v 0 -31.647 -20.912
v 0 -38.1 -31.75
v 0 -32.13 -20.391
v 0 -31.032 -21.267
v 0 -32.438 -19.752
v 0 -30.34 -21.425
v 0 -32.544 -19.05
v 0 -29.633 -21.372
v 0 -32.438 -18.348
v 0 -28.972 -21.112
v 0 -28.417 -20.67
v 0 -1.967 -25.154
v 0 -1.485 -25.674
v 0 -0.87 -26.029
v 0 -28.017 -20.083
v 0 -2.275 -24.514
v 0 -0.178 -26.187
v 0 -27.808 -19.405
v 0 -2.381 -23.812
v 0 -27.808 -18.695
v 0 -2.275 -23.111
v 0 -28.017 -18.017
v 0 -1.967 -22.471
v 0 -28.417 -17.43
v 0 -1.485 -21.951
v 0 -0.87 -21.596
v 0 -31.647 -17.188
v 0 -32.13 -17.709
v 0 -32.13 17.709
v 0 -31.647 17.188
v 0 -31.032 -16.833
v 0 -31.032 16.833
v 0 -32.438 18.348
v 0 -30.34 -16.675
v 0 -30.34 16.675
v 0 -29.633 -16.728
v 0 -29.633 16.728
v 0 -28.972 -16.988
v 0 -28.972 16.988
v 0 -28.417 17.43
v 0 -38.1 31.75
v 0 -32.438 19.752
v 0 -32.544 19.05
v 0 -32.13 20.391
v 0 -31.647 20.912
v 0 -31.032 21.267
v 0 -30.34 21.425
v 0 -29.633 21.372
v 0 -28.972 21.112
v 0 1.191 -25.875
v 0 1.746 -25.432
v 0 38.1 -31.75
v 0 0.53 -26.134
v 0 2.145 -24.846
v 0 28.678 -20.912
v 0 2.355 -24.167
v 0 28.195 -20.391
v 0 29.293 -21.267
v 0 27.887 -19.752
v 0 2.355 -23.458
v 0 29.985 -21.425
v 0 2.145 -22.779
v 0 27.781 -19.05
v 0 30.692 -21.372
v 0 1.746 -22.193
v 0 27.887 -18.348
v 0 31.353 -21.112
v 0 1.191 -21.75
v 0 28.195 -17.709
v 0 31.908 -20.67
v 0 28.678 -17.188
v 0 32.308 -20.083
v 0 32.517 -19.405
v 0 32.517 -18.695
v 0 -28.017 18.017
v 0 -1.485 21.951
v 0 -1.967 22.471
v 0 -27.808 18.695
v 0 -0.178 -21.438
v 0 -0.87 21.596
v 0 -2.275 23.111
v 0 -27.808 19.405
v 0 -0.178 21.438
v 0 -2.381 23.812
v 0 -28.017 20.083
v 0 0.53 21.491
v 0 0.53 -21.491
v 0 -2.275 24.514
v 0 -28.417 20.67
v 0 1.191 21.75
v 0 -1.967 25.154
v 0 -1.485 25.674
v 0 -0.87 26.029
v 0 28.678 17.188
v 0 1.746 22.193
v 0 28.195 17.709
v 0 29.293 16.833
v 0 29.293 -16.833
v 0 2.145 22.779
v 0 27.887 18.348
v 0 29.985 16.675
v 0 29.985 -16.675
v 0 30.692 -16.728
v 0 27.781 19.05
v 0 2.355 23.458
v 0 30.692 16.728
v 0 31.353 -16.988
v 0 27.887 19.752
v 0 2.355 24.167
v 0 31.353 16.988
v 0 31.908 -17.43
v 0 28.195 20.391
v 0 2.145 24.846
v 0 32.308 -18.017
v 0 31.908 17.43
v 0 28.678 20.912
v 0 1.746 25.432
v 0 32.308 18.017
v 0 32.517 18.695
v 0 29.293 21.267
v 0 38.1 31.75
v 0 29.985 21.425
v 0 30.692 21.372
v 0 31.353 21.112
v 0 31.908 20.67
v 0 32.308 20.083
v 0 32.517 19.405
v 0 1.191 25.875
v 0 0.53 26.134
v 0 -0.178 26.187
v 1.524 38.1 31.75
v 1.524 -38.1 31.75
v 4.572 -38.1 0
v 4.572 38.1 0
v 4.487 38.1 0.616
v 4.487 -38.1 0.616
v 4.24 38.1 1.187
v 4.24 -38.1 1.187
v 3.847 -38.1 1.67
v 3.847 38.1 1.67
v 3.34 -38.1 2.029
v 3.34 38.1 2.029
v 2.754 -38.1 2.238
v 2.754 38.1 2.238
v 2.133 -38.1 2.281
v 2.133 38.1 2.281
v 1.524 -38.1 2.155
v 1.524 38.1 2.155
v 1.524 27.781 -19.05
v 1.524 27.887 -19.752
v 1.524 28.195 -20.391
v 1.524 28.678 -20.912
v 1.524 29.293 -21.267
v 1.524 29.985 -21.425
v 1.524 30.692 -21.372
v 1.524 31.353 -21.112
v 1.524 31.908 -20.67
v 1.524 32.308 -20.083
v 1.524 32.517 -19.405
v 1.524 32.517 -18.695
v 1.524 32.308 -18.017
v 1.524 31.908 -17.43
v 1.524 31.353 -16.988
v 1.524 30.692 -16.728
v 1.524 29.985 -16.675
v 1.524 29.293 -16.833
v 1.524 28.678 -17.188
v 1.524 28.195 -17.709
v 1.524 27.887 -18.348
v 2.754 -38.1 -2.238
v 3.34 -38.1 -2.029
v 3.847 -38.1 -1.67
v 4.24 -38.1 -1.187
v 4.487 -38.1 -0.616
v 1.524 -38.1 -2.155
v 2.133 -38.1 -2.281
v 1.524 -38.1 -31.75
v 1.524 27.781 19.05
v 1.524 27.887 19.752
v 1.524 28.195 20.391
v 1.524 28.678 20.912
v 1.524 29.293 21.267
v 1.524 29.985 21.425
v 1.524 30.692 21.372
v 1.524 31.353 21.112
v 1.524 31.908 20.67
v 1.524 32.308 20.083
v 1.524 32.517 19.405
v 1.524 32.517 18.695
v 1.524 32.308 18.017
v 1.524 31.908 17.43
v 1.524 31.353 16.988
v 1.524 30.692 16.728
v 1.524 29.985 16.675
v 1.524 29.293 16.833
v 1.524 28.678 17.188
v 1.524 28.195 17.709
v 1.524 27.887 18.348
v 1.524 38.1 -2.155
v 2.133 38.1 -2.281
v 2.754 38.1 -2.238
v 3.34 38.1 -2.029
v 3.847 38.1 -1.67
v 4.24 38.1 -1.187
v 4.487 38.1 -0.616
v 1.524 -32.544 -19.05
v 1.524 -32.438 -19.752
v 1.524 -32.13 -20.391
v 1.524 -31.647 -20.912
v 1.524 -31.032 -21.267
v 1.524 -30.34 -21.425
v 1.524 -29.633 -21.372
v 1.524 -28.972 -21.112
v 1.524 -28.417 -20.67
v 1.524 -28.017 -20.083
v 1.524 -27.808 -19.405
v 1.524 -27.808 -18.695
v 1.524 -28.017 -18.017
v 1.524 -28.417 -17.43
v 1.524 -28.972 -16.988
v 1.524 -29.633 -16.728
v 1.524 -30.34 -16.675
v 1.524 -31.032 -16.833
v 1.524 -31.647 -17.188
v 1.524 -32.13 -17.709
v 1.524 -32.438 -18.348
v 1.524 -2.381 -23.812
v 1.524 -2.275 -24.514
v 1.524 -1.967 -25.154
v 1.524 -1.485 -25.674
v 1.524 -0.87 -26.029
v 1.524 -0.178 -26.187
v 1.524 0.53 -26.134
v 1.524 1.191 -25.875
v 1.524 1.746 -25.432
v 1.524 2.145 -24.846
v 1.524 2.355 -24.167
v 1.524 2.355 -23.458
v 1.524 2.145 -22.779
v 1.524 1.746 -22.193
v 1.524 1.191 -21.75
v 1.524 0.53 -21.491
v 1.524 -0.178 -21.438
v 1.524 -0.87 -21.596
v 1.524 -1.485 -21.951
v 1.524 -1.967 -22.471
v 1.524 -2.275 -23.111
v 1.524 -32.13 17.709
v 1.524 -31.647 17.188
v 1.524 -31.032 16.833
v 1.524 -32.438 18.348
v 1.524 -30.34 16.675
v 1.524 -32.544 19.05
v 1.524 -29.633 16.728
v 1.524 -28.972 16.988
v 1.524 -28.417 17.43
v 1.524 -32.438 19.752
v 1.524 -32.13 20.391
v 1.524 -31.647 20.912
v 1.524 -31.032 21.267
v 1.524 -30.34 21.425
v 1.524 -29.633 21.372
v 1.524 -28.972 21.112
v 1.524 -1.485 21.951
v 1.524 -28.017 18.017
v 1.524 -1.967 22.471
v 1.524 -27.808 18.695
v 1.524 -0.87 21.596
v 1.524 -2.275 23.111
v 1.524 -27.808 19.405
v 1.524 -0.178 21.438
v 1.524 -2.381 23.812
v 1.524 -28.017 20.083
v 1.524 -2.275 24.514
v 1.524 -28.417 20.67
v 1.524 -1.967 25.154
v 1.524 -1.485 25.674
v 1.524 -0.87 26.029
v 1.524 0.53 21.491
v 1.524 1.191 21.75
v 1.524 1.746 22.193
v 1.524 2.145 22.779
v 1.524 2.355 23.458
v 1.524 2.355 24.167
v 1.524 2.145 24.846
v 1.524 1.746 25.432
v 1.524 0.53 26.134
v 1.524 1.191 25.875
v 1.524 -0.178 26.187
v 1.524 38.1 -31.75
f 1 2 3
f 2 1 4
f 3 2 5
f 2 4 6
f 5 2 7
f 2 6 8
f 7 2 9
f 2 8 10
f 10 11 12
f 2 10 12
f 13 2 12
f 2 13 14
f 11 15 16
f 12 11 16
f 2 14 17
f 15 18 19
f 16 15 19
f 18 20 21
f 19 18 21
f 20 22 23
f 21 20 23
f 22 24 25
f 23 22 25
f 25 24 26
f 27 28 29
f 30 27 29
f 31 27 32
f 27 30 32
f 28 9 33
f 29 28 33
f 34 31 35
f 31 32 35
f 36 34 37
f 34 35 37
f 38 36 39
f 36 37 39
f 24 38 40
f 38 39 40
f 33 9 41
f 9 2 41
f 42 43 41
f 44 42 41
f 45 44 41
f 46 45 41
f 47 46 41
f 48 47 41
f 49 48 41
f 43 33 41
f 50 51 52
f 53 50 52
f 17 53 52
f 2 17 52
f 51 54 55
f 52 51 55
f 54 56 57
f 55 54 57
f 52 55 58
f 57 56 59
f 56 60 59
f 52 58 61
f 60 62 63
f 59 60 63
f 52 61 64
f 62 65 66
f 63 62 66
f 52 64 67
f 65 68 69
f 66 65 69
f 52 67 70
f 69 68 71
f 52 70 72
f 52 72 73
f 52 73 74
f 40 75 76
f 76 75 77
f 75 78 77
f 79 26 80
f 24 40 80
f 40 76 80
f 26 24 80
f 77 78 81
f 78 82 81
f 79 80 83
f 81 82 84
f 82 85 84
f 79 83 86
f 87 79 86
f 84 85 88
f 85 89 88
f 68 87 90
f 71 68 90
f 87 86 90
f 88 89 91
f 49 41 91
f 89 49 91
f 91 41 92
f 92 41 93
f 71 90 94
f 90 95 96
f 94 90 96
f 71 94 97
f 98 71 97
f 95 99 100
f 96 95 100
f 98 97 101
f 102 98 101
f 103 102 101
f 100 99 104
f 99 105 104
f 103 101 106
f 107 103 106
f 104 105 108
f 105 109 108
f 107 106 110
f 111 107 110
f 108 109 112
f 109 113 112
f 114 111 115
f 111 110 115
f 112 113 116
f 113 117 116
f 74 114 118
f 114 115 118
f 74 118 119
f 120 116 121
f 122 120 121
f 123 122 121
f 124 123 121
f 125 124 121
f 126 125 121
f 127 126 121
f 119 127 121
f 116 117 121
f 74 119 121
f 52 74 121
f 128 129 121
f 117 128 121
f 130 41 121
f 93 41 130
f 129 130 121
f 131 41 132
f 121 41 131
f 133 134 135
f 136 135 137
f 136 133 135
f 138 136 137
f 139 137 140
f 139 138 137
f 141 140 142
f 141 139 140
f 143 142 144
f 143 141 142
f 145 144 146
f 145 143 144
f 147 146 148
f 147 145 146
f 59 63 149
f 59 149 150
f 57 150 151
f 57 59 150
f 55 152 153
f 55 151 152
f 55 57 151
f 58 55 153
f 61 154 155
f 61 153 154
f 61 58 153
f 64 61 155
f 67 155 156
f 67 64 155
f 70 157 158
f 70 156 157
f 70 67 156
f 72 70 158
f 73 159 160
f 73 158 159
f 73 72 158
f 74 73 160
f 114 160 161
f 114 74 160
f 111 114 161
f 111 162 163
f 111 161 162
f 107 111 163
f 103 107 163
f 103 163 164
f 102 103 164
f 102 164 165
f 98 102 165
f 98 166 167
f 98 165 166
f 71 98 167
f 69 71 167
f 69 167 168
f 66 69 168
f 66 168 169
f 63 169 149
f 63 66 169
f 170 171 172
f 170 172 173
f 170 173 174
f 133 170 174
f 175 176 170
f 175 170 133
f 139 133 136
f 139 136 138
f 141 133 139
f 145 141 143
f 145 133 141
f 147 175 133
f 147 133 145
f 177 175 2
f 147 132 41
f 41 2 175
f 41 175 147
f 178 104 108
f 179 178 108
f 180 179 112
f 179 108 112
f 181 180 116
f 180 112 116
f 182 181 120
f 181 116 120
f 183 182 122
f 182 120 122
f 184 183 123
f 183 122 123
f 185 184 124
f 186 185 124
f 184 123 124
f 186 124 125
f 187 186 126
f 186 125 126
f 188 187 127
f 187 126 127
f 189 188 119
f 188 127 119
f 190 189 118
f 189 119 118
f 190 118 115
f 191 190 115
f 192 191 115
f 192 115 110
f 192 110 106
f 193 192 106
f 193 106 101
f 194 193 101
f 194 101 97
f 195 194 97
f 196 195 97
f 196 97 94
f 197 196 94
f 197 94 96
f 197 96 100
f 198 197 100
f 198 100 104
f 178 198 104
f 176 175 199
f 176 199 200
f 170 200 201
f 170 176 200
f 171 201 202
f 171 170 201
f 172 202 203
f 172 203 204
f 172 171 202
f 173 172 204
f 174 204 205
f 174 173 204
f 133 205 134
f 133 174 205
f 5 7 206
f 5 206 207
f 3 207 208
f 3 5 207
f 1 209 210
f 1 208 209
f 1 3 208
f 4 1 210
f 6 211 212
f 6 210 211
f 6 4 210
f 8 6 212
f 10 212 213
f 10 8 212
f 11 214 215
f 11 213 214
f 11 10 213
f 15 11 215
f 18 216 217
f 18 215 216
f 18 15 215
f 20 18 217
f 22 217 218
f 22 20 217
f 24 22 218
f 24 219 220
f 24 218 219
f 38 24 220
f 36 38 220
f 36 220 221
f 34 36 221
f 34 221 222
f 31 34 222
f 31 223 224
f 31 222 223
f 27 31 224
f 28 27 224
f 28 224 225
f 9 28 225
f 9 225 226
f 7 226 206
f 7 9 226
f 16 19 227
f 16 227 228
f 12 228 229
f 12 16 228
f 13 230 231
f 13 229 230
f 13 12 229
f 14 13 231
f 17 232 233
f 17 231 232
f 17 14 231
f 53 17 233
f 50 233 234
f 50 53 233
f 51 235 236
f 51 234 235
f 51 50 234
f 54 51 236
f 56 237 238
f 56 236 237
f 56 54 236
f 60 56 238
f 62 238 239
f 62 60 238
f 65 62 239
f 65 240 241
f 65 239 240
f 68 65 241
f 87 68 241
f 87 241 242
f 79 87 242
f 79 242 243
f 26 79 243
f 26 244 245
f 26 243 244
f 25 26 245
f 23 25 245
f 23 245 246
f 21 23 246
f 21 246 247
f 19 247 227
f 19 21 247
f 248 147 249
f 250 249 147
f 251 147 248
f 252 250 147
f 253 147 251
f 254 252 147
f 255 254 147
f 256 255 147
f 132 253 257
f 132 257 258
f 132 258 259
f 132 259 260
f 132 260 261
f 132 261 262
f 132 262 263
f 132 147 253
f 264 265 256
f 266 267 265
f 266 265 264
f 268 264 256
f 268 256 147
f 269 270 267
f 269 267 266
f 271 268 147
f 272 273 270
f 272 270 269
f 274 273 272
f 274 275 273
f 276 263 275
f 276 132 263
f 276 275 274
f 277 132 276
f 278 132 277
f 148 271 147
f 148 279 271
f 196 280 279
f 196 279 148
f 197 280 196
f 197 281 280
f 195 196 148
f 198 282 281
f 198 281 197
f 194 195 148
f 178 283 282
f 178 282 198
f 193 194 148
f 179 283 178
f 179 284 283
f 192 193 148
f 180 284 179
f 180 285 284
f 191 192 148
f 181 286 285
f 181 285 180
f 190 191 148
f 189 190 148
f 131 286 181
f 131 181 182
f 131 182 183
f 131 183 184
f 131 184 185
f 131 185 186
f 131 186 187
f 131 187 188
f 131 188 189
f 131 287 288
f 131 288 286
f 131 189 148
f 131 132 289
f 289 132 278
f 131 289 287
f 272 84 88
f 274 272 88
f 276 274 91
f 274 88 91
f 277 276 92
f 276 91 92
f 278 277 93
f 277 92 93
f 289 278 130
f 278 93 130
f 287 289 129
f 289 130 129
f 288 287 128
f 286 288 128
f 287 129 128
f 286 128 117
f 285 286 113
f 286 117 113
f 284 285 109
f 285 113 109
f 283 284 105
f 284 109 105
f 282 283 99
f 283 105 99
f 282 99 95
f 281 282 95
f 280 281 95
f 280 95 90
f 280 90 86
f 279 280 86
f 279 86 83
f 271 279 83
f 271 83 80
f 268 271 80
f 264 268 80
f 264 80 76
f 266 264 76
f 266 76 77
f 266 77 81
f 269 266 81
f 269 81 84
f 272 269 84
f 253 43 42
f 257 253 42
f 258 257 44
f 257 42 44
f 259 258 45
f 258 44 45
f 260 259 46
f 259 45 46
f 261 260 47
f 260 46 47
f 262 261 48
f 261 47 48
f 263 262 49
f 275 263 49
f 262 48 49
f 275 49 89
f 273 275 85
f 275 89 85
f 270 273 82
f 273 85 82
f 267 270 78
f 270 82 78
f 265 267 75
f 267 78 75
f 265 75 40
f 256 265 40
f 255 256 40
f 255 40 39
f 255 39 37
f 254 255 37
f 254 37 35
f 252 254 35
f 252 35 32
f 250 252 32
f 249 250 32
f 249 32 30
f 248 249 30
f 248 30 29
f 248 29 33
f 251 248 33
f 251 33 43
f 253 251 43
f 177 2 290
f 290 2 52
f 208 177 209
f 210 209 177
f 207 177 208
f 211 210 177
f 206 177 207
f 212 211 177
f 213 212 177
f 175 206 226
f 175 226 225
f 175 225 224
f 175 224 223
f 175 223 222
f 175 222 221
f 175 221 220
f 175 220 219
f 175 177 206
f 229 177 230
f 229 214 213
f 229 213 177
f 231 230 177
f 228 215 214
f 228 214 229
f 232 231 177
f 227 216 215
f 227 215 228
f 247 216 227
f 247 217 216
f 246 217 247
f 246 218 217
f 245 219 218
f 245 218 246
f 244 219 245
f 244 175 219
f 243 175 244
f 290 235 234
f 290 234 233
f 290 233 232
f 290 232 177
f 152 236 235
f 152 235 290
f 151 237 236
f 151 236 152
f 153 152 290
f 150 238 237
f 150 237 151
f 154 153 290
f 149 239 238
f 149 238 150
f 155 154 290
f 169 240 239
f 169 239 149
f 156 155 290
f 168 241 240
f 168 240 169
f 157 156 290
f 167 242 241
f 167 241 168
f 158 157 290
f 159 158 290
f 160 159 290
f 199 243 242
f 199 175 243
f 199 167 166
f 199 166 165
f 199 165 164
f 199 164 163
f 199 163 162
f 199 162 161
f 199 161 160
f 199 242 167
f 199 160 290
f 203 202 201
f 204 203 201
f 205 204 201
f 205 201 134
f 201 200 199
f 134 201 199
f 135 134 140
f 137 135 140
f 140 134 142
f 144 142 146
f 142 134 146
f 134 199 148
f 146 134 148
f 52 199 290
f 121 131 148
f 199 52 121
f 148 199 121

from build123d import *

# Parameters (mm, degrees)
F0_W     = 76.2
F0_H     = 63.5
F1_DEPTH = 1.524
F3_DEPTH = 76.2
F5_D     = 4.7625


# Not quite as in the source:
# - a pattern or mirror of a feature is missing from the dataset's text; its kind, count and spacing are read off the source's solid


with BuildPart() as f1:
    # F0 (on Right) → F1 (new body)
    with BuildSketch(Plane.YZ):
        Rectangle(F0_W, F0_H)
    extrude(amount=F1_DEPTH)

    # F2 (on face) → F3 (join, through all)
    with BuildSketch(Plane.XZ.offset(38.1)):
        with BuildLine():
            ThreePointArc((1.524, -2.1552614691), (3.6058227154, -1.866511184), (4.572, 0))
            ThreePointArc((4.572, 0), (3.6058227154, 1.866511184), (1.524, 2.1552614691))
            Line((1.524, 2.1552614691), (1.524, -2.1552614691))
        make_face()
    extrude(amount=-F3_DEPTH)

    # F5 (through all)
    with Locations(Plane.YZ.offset(1.524)):
        with Locations((-30.1625, 19.05), (0, 23.8125), (30.1625, 19.05)):
            f5 = Hole(F5_D / 2)

    # F5_copies: F5 across plane
    add(f5.mirror(Plane(origin=(0, 0, 0), x_dir=(-1, 0, 0), z_dir=(0, 0, -1))), mode=Mode.SUBTRACT)


solid = f1.part
